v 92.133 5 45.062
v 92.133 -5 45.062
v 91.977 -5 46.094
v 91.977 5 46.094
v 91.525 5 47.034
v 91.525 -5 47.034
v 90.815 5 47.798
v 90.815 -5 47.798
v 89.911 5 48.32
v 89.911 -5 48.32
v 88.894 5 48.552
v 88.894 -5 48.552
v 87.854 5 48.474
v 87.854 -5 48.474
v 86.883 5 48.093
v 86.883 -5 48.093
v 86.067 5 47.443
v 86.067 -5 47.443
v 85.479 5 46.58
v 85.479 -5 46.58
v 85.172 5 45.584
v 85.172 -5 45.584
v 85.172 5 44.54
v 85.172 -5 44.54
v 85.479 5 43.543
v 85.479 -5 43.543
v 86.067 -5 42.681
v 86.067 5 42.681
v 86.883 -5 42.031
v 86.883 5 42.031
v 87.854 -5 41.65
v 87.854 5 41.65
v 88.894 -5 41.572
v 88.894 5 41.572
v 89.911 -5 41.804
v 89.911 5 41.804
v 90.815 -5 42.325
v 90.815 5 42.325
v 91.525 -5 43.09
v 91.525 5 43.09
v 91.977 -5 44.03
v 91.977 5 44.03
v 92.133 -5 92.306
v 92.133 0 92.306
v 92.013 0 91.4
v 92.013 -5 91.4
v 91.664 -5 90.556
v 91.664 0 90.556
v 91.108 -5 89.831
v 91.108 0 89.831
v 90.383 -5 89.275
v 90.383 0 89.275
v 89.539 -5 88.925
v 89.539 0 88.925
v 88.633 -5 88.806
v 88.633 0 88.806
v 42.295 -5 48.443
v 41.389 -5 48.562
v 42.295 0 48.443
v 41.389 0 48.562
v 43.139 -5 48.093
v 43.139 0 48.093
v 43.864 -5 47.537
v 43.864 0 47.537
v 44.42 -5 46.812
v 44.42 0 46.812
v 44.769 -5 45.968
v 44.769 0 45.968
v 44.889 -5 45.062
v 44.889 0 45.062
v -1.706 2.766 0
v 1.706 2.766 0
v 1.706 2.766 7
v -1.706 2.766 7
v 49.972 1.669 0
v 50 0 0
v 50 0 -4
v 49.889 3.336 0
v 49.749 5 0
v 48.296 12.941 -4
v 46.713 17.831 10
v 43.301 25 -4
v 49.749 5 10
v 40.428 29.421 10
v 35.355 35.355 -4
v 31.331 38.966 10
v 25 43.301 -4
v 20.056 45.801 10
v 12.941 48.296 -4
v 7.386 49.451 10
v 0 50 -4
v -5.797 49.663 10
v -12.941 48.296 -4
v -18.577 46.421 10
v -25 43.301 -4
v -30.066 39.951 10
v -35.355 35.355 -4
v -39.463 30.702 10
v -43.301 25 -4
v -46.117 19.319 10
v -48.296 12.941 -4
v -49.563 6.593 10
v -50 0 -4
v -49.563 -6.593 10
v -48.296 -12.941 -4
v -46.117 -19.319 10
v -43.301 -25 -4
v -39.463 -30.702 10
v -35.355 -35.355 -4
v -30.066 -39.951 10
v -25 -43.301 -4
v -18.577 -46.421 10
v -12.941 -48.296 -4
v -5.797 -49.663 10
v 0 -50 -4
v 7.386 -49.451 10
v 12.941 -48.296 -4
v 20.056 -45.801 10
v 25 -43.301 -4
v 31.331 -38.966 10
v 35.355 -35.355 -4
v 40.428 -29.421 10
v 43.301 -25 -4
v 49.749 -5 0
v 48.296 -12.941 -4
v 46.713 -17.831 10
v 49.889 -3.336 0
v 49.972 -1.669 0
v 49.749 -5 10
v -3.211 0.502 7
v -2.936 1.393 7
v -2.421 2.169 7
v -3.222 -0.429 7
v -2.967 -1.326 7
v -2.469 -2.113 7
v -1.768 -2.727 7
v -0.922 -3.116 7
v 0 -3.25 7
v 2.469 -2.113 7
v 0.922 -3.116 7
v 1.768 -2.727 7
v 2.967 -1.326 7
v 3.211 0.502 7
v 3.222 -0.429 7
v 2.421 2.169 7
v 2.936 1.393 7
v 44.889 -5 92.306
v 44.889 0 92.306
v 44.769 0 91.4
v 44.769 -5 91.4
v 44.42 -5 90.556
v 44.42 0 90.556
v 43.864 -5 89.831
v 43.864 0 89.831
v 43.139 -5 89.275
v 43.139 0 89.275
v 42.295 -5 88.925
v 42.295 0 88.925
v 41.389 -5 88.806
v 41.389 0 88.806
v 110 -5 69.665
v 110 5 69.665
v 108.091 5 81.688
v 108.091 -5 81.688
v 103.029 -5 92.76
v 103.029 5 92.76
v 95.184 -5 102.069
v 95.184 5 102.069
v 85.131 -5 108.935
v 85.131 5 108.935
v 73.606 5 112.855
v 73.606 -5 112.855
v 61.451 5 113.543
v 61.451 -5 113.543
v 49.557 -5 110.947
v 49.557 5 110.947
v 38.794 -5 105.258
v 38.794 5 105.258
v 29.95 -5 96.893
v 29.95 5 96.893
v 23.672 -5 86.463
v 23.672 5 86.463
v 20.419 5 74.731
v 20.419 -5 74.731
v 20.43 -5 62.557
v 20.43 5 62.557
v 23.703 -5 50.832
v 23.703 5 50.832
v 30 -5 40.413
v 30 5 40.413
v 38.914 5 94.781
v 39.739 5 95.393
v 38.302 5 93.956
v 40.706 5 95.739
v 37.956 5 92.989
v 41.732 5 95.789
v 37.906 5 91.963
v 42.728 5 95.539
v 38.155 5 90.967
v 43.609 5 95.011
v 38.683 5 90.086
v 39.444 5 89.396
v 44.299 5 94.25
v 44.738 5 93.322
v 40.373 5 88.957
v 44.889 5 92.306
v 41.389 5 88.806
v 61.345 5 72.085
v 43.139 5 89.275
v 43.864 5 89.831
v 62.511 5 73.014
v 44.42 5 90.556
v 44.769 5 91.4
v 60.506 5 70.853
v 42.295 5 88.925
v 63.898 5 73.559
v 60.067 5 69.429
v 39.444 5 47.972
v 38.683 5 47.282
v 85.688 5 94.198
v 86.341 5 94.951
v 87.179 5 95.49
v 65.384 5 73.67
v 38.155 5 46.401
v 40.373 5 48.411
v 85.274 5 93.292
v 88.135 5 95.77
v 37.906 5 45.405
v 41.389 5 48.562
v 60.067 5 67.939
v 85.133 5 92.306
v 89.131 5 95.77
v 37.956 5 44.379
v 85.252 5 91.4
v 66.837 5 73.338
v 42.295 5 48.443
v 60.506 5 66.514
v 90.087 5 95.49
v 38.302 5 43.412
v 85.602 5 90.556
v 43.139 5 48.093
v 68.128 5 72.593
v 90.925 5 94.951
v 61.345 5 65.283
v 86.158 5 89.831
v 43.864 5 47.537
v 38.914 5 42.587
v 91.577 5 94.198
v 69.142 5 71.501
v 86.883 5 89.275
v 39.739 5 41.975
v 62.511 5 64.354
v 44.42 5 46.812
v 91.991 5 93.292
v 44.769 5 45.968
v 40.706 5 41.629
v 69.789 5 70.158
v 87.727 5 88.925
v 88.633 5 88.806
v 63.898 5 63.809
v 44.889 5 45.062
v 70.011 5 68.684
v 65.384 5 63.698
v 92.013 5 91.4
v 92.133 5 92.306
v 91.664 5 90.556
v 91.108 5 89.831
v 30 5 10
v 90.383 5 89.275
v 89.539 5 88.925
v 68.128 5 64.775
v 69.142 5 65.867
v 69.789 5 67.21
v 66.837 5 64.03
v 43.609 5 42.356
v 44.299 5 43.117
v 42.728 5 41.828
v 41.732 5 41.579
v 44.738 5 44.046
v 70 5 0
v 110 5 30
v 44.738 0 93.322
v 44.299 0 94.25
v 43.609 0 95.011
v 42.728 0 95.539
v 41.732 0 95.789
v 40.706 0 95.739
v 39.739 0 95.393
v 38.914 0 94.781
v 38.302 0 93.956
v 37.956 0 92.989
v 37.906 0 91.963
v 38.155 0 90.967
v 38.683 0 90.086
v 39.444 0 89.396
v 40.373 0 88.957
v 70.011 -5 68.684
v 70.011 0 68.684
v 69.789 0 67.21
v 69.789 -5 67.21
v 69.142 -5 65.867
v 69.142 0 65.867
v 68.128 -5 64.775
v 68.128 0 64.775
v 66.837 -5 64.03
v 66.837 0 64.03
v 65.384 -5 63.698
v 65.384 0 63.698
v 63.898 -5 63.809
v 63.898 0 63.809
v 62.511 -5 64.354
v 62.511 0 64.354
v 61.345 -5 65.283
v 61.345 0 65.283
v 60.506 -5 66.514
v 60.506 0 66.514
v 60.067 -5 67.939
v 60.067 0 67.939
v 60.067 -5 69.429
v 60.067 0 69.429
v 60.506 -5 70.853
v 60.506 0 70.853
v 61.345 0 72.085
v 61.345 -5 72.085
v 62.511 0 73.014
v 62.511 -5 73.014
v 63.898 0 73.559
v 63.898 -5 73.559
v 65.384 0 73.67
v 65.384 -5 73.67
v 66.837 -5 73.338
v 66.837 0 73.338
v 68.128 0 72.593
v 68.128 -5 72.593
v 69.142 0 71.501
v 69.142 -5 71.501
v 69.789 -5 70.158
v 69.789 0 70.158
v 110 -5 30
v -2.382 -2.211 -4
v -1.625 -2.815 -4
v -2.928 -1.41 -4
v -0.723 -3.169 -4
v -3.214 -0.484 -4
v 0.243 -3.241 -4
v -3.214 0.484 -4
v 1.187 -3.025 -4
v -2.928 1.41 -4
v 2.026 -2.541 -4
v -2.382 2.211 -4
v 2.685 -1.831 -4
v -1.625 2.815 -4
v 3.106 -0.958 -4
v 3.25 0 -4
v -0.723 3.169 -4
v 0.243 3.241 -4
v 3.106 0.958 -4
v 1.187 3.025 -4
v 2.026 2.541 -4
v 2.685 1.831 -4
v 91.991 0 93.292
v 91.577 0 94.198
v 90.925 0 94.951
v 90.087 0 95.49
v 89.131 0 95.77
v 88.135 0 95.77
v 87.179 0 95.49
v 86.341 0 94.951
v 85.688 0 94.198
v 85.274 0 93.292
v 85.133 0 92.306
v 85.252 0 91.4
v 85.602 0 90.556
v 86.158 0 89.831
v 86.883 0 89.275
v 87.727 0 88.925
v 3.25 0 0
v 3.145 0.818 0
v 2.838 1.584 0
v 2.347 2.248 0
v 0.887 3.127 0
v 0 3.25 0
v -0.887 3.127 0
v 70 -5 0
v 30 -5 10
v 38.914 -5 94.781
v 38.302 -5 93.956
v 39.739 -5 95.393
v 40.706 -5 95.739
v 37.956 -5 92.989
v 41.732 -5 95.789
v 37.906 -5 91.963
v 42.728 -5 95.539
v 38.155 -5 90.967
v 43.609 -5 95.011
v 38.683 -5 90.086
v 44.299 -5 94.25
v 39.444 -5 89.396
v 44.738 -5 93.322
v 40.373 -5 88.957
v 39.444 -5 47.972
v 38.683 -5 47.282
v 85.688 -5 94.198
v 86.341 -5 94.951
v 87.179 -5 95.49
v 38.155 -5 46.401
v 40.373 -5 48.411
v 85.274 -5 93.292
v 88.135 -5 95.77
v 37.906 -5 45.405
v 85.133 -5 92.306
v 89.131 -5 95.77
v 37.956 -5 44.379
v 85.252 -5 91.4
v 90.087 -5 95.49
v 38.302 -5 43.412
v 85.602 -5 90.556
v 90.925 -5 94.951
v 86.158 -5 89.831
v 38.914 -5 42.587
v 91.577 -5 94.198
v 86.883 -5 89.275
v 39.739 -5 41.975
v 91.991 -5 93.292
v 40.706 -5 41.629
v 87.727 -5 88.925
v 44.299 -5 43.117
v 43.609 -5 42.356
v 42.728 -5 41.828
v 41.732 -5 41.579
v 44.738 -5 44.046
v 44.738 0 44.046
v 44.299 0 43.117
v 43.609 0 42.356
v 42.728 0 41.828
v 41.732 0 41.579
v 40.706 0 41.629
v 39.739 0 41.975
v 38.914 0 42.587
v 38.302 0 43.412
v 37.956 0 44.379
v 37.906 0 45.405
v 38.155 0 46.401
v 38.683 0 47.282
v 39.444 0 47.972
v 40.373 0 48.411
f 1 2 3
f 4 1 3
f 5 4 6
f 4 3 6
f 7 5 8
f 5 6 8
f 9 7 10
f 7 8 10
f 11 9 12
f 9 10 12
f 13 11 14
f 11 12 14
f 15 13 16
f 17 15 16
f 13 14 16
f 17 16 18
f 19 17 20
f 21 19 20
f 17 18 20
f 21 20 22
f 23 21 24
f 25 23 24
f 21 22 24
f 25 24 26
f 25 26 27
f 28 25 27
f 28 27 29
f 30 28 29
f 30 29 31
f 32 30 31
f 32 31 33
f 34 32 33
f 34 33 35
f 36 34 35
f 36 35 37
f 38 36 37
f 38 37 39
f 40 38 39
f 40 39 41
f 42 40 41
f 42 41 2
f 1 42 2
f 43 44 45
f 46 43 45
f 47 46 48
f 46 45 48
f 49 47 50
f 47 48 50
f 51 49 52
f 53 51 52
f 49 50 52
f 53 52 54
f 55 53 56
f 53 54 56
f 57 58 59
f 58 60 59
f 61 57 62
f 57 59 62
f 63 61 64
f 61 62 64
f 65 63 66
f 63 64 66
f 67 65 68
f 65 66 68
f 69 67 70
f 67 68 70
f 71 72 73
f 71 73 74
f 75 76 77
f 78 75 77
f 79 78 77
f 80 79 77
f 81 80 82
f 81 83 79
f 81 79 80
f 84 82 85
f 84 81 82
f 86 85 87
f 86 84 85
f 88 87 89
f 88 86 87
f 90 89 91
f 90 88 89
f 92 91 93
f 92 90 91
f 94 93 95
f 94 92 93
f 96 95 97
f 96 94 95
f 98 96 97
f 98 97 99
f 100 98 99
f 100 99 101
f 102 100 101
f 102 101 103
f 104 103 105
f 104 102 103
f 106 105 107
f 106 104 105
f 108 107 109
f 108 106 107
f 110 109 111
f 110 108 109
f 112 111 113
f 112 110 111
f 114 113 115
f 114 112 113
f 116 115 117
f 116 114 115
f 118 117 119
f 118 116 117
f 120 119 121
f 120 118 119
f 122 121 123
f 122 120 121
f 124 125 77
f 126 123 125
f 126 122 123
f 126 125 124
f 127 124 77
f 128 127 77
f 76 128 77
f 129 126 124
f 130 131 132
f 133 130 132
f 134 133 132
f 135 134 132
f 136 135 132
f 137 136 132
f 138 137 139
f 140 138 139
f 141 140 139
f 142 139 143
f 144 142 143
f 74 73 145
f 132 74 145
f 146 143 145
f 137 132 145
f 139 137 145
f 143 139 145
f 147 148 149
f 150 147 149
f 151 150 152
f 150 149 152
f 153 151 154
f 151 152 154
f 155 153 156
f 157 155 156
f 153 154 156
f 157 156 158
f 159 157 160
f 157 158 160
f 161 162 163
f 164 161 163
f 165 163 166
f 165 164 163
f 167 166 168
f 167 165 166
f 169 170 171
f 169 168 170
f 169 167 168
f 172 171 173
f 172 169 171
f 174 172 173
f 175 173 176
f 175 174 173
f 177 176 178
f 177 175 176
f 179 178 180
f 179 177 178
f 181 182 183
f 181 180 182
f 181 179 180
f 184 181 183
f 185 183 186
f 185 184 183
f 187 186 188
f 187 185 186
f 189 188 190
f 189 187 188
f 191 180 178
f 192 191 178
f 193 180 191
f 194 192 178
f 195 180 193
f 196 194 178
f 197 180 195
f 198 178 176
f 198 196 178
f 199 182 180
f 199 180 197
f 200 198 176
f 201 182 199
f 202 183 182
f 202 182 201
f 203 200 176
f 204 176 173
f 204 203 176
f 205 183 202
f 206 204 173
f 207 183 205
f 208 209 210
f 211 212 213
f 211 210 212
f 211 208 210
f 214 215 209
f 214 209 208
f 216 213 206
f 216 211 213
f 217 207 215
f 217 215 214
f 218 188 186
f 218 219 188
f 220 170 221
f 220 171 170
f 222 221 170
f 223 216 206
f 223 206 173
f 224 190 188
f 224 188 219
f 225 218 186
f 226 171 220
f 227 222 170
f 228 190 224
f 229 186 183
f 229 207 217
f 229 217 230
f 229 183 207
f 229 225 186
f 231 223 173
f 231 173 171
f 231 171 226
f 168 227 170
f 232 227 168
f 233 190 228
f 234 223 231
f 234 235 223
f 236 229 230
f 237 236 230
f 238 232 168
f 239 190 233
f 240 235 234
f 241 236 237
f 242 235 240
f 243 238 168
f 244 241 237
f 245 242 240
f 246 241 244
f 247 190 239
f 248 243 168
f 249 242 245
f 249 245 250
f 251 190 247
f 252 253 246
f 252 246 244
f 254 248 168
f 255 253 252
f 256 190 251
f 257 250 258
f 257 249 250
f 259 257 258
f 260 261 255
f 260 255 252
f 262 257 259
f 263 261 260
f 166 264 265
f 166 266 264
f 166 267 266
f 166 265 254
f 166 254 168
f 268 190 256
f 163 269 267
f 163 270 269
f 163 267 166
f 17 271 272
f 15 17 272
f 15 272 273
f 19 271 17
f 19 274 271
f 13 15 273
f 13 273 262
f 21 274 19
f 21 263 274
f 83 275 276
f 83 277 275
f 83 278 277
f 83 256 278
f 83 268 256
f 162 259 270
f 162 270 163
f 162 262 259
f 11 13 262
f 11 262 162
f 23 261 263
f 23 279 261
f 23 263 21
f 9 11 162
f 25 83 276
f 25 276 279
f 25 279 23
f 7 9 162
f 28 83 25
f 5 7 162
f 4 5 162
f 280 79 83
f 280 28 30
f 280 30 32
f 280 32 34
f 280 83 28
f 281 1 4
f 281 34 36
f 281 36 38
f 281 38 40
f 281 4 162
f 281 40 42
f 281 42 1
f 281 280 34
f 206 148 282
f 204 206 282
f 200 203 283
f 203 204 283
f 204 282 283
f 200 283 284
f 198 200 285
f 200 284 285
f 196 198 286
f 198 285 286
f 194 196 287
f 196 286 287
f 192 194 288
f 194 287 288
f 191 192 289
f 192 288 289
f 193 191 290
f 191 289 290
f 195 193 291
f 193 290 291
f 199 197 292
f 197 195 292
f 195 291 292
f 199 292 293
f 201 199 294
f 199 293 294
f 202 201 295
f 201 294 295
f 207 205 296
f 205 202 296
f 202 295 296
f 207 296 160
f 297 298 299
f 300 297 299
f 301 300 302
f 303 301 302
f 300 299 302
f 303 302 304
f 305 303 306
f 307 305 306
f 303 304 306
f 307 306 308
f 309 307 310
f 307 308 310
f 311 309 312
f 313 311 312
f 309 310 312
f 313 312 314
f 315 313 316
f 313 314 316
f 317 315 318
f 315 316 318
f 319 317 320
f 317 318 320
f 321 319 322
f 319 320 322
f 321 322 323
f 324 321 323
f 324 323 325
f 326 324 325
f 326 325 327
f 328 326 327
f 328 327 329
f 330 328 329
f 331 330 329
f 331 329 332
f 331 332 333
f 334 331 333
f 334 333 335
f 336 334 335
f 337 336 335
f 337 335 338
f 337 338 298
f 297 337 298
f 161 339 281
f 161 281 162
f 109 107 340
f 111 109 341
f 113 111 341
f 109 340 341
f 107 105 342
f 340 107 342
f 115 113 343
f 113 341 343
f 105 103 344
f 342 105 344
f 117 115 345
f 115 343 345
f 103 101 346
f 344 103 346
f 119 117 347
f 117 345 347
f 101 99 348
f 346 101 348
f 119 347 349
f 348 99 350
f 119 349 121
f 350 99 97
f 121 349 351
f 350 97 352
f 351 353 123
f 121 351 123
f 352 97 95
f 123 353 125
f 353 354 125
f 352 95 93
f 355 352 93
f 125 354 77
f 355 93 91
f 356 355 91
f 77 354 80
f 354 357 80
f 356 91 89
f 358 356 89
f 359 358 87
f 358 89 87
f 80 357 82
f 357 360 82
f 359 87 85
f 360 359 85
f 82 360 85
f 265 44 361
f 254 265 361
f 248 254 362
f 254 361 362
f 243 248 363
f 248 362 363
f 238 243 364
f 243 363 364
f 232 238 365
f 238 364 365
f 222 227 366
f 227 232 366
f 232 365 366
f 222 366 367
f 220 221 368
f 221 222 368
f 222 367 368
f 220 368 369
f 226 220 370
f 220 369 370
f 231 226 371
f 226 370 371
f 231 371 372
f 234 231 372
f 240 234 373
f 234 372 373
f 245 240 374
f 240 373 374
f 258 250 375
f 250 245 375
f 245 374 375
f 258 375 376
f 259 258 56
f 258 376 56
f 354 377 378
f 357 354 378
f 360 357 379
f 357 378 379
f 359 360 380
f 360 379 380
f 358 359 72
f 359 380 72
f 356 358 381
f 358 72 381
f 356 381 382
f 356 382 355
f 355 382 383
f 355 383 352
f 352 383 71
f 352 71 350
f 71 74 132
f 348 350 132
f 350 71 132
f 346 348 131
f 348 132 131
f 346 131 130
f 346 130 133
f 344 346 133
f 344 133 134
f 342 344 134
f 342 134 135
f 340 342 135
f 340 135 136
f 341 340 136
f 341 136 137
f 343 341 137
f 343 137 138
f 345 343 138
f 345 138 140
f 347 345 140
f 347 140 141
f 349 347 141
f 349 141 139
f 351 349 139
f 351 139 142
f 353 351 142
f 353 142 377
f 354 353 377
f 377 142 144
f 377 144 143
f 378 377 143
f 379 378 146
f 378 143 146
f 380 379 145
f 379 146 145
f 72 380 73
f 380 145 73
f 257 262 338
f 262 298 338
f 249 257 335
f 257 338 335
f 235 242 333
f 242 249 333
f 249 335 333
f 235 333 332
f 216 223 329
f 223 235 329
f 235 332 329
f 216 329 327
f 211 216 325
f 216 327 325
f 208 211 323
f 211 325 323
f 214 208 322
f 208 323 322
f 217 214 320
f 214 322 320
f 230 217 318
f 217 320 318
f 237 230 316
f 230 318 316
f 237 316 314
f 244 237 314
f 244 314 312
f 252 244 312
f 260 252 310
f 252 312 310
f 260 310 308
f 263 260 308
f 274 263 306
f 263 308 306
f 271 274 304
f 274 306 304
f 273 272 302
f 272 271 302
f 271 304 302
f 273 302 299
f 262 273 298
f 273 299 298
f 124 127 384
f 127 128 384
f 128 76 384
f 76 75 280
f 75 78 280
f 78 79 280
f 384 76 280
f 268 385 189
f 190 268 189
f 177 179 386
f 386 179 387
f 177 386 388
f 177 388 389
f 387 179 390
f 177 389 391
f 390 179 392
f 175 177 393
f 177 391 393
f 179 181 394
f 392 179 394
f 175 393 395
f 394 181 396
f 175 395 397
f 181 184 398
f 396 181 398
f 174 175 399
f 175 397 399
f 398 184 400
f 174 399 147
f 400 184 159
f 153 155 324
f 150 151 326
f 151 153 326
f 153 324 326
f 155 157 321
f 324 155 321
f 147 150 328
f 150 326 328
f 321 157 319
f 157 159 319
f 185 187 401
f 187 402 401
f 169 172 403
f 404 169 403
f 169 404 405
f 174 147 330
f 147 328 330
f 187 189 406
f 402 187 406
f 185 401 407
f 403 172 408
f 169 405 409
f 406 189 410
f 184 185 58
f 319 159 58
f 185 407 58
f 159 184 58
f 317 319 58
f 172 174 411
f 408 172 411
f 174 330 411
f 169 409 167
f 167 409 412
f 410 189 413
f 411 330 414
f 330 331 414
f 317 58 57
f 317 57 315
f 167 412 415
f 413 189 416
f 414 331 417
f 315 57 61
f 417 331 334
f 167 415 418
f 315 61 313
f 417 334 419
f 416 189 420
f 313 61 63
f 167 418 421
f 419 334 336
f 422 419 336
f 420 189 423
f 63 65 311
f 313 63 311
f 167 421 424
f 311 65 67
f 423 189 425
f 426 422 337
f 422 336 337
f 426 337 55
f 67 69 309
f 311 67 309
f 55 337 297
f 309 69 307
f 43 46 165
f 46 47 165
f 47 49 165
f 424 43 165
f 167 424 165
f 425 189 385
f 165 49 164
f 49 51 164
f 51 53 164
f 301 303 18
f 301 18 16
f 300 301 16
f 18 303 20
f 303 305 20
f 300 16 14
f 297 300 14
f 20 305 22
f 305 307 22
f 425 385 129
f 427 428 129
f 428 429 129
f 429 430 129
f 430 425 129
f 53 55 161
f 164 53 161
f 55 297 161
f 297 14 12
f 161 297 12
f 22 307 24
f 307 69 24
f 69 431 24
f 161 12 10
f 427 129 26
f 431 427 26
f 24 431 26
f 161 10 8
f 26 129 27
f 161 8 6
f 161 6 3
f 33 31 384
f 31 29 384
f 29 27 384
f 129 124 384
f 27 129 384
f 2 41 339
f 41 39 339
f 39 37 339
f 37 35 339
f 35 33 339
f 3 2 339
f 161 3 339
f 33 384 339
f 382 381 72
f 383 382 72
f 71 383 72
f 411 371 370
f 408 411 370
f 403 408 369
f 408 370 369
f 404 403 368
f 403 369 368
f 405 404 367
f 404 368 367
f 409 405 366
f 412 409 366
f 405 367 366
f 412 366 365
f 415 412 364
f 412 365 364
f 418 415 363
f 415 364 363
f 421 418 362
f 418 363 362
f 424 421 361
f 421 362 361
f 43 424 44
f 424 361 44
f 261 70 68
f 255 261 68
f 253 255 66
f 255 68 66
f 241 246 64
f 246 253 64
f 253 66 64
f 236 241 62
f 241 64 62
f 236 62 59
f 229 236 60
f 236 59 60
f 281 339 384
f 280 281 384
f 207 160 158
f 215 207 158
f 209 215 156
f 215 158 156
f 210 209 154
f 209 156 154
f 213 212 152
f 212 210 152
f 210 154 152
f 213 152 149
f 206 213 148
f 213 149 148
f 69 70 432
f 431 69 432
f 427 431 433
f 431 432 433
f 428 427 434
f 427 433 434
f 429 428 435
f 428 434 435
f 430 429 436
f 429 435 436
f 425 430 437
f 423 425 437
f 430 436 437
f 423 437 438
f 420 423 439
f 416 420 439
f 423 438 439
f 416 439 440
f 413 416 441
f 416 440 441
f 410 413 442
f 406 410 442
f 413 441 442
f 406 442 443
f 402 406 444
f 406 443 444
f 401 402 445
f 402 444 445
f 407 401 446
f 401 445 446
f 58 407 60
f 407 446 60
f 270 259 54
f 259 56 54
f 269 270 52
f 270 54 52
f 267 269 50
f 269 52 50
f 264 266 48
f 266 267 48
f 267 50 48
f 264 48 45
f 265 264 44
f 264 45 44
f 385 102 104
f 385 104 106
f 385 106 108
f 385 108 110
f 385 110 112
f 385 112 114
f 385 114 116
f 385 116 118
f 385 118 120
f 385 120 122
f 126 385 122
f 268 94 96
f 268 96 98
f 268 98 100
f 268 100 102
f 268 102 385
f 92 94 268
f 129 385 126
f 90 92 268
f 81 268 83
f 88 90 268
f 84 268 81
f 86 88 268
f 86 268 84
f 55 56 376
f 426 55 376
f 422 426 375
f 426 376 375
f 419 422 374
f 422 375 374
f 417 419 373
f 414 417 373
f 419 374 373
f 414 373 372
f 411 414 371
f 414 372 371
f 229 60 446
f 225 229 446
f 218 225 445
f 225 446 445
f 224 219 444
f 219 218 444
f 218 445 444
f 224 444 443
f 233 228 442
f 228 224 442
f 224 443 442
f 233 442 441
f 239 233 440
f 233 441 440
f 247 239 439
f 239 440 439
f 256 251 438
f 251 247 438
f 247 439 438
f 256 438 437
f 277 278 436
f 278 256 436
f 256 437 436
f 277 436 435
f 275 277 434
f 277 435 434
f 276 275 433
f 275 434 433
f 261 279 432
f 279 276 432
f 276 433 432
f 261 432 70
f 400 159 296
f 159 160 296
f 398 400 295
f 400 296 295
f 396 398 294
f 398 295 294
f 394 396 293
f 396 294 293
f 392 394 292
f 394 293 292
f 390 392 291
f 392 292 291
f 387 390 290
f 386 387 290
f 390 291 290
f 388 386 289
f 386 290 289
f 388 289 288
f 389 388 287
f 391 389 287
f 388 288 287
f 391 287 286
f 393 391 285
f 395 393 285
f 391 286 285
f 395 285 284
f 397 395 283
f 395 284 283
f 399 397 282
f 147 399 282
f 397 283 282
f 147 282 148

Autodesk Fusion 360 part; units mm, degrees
sketch "Sketch1" plane through (0, 0, 0) normal (0, 0, 1) x (1, 0, 0)
  circle A0 centre (0, 0) radius 50
  circle A1 centre (0, 0) radius 3.25
  line L0 (1.7058, 2.7664) -> (-1.7058, 2.7664)
  dimension "d1" = 100
  dimension "d2" = 6.5
extrude "Extrude1" add sketch "Sketch1" along normal blind 10 contours A0 | A1 L0 | A1 L0
extrude "Extrude2" cut sketch "Sketch1" along normal blind 7 contours A1 L0 picked at (0.999, 0.1306)
sketch "Sketch2" plane through (0, 0, 0) normal (0, 1, 0) x (1, 0, 0)
  line L0 (0, 20) -> (0, -60)
  line L1 (30, 20) -> (30, -40.4129)
  line L2 (110, 20) -> (110, -69.665)
  line L3 (-75, 0) -> (110, 0)
  line L4 (-75, -60) -> (115, -60)
  line L5 (90, -50) -> (130, -50)
  circle A0 centre (65.0107, -68.6839) radius 45
  circle A1 centre (65.0107, -68.6839) radius 5
  line L6 (88.6327, -92.3059) -> (41.3887, -92.3059)
  line L7 (41.3887, -92.3059) -> (41.3887, -45.0619)
  line L8 (41.3887, -45.0619) -> (88.6327, -45.0619)
  line L9 (88.6327, -45.0619) -> (88.6327, -92.3059)
  line L10 (88.6327, -92.3059) -> (41.3887, -45.0619) construction
  line L11 (41.3887, -92.3059) -> (88.6327, -45.0619) construction
  circle A2 centre (41.3887, -45.0619) radius 3.5
  circle A3 centre (88.6327, -45.0619) radius 3.5
  circle A4 centre (41.3887, -92.3059) radius 3.5
  circle A5 centre (88.6327, -92.3059) radius 3.5
  line L12 (110, -30) -> (70, 0)
  point P0 (65.0107, -68.6839)
  dimension "d7" = 30
  dimension "d8" = 80
  dimension "d9" = 60
  dimension "d10" = 50
  dimension "d11" = 90
  dimension "d12" = 10
  dimension "d13" = 47.244
  dimension "d14" = 47.244
  dimension "d15" = 7
  dimension "d16" = 7
  dimension "d17" = 7
  dimension "d18" = 7
extrude "Extrude3" add sketch "Sketch2" along normal mid plane 10 contours L1 L2 L3 L5 A0 L12 | L4 A0 L7 L8 L9 A2 A3 | L2 L4 A0 L6 L7 L9 A4 A5 | L4 L7 L8 L9 A2 A3 | L4 L6 L7 L9 A4 A5 | L2 L4 L5 A0 | L2 L4 A0
extrude "Extrude4" add sketch "Sketch1" against normal blind 4
component "6627T54_Stepper Motor (2)" placed x (1, 0, 0) y (0, 0, -1) z (0, 1, 0) at (-34.4133, -232.4903, 46.7909)
